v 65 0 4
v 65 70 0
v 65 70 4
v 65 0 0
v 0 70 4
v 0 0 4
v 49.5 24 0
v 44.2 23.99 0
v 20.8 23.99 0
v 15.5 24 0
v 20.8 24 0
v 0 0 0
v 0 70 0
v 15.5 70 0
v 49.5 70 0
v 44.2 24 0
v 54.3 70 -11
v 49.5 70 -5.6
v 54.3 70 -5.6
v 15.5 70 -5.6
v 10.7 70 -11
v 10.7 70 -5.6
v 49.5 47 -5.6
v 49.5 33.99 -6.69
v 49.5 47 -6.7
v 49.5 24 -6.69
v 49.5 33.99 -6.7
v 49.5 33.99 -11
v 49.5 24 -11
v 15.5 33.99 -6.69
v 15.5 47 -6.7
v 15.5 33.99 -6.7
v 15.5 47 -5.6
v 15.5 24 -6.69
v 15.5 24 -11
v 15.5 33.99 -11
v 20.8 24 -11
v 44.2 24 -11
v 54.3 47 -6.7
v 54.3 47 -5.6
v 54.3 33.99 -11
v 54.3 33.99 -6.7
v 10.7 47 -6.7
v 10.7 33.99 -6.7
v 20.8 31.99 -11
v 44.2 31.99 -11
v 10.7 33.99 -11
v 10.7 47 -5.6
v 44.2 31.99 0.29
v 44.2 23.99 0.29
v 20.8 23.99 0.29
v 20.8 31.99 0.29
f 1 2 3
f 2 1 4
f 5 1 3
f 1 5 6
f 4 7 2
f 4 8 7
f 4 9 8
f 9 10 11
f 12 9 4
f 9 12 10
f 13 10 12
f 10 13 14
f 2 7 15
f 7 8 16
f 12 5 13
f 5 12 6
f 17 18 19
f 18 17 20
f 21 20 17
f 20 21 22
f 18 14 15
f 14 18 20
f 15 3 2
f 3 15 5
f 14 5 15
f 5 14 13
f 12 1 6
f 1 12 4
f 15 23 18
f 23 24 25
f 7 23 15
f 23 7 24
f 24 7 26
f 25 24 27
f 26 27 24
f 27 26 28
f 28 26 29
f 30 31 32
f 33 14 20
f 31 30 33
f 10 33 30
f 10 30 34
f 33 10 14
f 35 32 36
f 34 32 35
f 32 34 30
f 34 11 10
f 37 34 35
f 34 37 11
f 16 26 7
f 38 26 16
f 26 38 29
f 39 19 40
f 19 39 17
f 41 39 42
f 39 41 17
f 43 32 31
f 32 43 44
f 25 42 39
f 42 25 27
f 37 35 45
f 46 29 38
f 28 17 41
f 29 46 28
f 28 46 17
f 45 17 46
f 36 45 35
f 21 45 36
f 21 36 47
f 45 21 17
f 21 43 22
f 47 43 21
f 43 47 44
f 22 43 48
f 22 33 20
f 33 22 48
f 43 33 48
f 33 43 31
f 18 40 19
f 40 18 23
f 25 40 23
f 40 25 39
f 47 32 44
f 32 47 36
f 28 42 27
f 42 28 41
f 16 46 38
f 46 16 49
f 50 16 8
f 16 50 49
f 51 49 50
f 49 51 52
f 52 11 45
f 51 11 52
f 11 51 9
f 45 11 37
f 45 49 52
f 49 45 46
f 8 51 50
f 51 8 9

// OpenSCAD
mount_depth = 70;
mount_thickness = 4;
wire_diameter = 2;
inset = 12.5;
wire_gap = 20;
mount_width = 65;// wire_gap+inset*2;

$fn = 120;

module top_mount() {
    difference() { 
        cube([mount_width, mount_depth, mount_thickness]);
        wires();
        translate([mount_width/2,mount_depth/4,0]) nut_hole();
        translate([mount_width/2,mount_depth/4*3,0]) nut_hole();
    }
}

module bottom_mount() {
    difference() {
        cube([mount_width, mount_depth, mount_thickness]);
        translate([0,0,mount_thickness]) wires();
        translate([mount_width/2,mount_depth/4,0]) bolt_hole();
        translate([mount_width/2,mount_depth/4*3,0]) bolt_hole();
    }
}

module wires() {
    for (i = [inset:wire_gap:mount_width]) {
        translate([i,-.01,0]) rotate([-90, 0, 0]) cylinder(h = mount_depth + .02, r = wire_diameter);
    }
}

nut_thickness = mount_thickness/2;
nut_diameter = 5;
bolt_thickness = 3;

module nut_hole() {
    translate([0,0,nut_thickness+.01]) cylinder(h = nut_thickness, d = nut_diameter, $fn = 6);
    translate([0,0,-.01]) cylinder(h = mount_thickness+.02, d = bolt_thickness);
}

bolt_head_diameter = 5;
bolt_head_thickness = 3;

module bolt_hole() {
    translate([0,0,-.01]) cylinder(h = nut_thickness, d = bolt_head_diameter);
    translate([0,0,.01]) cylinder(h = mount_thickness+.02, d = bolt_head_thickness);
}

slot_height = 7;
slot_inside_width = 34;
slot_front_inset = 24;
slot_bottom_width = 43.6;
slot_bottom_thickness = 4.3;
slot_thickener_start = 23;
slot_thickening = slot_height - 5.6;

module connector_without_cutouts() {
    cube([mount_width, mount_depth, mount_thickness]);
    translate([(mount_width - slot_inside_width)/2, slot_front_inset, -slot_height]) cube([slot_inside_width, mount_depth-slot_front_inset, slot_height]);
    translate([(mount_width - slot_bottom_width)/2, slot_front_inset, -slot_height-mount_thickness]) cube([slot_bottom_width, mount_depth-slot_front_inset, slot_bottom_thickness]);
    translate([(mount_width-slot_bottom_width)/2,slot_thickener_start+slot_front_inset,-slot_height]) cube([(slot_bottom_width-slot_inside_width)/2, mount_depth-slot_thickener_start-slot_front_inset, slot_thickening]);
    translate([(mount_width-slot_bottom_width)/2+slot_inside_width+(slot_bottom_width-slot_inside_width)/2,slot_thickener_start+slot_front_inset,-slot_height]) cube([(slot_bottom_width-slot_inside_width)/2, mount_depth-slot_thickener_start-slot_front_inset, slot_thickening]);
}

corner_cut_width = (slot_bottom_width - slot_inside_width)/2;
corner_cut_depth = 10;
center_cut_width = 23.4;
center_cut_depth = 8;

module connector() {
    difference( ) {
        connector_without_cutouts();
        translate([(mount_width - slot_bottom_width)/2 - .01,slot_front_inset-.01,-slot_height -mount_thickness-.01])
            cube([corner_cut_width+.01, corner_cut_depth, slot_bottom_thickness+.02]);
        translate([(mount_width - slot_bottom_width)/2 + slot_inside_width+ corner_cut_width,slot_front_inset-.01,-slot_height -mount_thickness-.01])
            cube([corner_cut_width+.01, corner_cut_depth, slot_bottom_thickness+.02]);
        translate([(mount_width-center_cut_width)/2, slot_front_inset-.01, -mount_thickness-slot_height-.01])
            cube([center_cut_width, center_cut_depth, slot_bottom_thickness+slot_height]);
    }
}

connector();
//translate([0,0, mount_thickness]) bottom_mount();

//top_mount();
//translate([0,0, -mount_thickness]) {
//    bottom_mount();
//}
